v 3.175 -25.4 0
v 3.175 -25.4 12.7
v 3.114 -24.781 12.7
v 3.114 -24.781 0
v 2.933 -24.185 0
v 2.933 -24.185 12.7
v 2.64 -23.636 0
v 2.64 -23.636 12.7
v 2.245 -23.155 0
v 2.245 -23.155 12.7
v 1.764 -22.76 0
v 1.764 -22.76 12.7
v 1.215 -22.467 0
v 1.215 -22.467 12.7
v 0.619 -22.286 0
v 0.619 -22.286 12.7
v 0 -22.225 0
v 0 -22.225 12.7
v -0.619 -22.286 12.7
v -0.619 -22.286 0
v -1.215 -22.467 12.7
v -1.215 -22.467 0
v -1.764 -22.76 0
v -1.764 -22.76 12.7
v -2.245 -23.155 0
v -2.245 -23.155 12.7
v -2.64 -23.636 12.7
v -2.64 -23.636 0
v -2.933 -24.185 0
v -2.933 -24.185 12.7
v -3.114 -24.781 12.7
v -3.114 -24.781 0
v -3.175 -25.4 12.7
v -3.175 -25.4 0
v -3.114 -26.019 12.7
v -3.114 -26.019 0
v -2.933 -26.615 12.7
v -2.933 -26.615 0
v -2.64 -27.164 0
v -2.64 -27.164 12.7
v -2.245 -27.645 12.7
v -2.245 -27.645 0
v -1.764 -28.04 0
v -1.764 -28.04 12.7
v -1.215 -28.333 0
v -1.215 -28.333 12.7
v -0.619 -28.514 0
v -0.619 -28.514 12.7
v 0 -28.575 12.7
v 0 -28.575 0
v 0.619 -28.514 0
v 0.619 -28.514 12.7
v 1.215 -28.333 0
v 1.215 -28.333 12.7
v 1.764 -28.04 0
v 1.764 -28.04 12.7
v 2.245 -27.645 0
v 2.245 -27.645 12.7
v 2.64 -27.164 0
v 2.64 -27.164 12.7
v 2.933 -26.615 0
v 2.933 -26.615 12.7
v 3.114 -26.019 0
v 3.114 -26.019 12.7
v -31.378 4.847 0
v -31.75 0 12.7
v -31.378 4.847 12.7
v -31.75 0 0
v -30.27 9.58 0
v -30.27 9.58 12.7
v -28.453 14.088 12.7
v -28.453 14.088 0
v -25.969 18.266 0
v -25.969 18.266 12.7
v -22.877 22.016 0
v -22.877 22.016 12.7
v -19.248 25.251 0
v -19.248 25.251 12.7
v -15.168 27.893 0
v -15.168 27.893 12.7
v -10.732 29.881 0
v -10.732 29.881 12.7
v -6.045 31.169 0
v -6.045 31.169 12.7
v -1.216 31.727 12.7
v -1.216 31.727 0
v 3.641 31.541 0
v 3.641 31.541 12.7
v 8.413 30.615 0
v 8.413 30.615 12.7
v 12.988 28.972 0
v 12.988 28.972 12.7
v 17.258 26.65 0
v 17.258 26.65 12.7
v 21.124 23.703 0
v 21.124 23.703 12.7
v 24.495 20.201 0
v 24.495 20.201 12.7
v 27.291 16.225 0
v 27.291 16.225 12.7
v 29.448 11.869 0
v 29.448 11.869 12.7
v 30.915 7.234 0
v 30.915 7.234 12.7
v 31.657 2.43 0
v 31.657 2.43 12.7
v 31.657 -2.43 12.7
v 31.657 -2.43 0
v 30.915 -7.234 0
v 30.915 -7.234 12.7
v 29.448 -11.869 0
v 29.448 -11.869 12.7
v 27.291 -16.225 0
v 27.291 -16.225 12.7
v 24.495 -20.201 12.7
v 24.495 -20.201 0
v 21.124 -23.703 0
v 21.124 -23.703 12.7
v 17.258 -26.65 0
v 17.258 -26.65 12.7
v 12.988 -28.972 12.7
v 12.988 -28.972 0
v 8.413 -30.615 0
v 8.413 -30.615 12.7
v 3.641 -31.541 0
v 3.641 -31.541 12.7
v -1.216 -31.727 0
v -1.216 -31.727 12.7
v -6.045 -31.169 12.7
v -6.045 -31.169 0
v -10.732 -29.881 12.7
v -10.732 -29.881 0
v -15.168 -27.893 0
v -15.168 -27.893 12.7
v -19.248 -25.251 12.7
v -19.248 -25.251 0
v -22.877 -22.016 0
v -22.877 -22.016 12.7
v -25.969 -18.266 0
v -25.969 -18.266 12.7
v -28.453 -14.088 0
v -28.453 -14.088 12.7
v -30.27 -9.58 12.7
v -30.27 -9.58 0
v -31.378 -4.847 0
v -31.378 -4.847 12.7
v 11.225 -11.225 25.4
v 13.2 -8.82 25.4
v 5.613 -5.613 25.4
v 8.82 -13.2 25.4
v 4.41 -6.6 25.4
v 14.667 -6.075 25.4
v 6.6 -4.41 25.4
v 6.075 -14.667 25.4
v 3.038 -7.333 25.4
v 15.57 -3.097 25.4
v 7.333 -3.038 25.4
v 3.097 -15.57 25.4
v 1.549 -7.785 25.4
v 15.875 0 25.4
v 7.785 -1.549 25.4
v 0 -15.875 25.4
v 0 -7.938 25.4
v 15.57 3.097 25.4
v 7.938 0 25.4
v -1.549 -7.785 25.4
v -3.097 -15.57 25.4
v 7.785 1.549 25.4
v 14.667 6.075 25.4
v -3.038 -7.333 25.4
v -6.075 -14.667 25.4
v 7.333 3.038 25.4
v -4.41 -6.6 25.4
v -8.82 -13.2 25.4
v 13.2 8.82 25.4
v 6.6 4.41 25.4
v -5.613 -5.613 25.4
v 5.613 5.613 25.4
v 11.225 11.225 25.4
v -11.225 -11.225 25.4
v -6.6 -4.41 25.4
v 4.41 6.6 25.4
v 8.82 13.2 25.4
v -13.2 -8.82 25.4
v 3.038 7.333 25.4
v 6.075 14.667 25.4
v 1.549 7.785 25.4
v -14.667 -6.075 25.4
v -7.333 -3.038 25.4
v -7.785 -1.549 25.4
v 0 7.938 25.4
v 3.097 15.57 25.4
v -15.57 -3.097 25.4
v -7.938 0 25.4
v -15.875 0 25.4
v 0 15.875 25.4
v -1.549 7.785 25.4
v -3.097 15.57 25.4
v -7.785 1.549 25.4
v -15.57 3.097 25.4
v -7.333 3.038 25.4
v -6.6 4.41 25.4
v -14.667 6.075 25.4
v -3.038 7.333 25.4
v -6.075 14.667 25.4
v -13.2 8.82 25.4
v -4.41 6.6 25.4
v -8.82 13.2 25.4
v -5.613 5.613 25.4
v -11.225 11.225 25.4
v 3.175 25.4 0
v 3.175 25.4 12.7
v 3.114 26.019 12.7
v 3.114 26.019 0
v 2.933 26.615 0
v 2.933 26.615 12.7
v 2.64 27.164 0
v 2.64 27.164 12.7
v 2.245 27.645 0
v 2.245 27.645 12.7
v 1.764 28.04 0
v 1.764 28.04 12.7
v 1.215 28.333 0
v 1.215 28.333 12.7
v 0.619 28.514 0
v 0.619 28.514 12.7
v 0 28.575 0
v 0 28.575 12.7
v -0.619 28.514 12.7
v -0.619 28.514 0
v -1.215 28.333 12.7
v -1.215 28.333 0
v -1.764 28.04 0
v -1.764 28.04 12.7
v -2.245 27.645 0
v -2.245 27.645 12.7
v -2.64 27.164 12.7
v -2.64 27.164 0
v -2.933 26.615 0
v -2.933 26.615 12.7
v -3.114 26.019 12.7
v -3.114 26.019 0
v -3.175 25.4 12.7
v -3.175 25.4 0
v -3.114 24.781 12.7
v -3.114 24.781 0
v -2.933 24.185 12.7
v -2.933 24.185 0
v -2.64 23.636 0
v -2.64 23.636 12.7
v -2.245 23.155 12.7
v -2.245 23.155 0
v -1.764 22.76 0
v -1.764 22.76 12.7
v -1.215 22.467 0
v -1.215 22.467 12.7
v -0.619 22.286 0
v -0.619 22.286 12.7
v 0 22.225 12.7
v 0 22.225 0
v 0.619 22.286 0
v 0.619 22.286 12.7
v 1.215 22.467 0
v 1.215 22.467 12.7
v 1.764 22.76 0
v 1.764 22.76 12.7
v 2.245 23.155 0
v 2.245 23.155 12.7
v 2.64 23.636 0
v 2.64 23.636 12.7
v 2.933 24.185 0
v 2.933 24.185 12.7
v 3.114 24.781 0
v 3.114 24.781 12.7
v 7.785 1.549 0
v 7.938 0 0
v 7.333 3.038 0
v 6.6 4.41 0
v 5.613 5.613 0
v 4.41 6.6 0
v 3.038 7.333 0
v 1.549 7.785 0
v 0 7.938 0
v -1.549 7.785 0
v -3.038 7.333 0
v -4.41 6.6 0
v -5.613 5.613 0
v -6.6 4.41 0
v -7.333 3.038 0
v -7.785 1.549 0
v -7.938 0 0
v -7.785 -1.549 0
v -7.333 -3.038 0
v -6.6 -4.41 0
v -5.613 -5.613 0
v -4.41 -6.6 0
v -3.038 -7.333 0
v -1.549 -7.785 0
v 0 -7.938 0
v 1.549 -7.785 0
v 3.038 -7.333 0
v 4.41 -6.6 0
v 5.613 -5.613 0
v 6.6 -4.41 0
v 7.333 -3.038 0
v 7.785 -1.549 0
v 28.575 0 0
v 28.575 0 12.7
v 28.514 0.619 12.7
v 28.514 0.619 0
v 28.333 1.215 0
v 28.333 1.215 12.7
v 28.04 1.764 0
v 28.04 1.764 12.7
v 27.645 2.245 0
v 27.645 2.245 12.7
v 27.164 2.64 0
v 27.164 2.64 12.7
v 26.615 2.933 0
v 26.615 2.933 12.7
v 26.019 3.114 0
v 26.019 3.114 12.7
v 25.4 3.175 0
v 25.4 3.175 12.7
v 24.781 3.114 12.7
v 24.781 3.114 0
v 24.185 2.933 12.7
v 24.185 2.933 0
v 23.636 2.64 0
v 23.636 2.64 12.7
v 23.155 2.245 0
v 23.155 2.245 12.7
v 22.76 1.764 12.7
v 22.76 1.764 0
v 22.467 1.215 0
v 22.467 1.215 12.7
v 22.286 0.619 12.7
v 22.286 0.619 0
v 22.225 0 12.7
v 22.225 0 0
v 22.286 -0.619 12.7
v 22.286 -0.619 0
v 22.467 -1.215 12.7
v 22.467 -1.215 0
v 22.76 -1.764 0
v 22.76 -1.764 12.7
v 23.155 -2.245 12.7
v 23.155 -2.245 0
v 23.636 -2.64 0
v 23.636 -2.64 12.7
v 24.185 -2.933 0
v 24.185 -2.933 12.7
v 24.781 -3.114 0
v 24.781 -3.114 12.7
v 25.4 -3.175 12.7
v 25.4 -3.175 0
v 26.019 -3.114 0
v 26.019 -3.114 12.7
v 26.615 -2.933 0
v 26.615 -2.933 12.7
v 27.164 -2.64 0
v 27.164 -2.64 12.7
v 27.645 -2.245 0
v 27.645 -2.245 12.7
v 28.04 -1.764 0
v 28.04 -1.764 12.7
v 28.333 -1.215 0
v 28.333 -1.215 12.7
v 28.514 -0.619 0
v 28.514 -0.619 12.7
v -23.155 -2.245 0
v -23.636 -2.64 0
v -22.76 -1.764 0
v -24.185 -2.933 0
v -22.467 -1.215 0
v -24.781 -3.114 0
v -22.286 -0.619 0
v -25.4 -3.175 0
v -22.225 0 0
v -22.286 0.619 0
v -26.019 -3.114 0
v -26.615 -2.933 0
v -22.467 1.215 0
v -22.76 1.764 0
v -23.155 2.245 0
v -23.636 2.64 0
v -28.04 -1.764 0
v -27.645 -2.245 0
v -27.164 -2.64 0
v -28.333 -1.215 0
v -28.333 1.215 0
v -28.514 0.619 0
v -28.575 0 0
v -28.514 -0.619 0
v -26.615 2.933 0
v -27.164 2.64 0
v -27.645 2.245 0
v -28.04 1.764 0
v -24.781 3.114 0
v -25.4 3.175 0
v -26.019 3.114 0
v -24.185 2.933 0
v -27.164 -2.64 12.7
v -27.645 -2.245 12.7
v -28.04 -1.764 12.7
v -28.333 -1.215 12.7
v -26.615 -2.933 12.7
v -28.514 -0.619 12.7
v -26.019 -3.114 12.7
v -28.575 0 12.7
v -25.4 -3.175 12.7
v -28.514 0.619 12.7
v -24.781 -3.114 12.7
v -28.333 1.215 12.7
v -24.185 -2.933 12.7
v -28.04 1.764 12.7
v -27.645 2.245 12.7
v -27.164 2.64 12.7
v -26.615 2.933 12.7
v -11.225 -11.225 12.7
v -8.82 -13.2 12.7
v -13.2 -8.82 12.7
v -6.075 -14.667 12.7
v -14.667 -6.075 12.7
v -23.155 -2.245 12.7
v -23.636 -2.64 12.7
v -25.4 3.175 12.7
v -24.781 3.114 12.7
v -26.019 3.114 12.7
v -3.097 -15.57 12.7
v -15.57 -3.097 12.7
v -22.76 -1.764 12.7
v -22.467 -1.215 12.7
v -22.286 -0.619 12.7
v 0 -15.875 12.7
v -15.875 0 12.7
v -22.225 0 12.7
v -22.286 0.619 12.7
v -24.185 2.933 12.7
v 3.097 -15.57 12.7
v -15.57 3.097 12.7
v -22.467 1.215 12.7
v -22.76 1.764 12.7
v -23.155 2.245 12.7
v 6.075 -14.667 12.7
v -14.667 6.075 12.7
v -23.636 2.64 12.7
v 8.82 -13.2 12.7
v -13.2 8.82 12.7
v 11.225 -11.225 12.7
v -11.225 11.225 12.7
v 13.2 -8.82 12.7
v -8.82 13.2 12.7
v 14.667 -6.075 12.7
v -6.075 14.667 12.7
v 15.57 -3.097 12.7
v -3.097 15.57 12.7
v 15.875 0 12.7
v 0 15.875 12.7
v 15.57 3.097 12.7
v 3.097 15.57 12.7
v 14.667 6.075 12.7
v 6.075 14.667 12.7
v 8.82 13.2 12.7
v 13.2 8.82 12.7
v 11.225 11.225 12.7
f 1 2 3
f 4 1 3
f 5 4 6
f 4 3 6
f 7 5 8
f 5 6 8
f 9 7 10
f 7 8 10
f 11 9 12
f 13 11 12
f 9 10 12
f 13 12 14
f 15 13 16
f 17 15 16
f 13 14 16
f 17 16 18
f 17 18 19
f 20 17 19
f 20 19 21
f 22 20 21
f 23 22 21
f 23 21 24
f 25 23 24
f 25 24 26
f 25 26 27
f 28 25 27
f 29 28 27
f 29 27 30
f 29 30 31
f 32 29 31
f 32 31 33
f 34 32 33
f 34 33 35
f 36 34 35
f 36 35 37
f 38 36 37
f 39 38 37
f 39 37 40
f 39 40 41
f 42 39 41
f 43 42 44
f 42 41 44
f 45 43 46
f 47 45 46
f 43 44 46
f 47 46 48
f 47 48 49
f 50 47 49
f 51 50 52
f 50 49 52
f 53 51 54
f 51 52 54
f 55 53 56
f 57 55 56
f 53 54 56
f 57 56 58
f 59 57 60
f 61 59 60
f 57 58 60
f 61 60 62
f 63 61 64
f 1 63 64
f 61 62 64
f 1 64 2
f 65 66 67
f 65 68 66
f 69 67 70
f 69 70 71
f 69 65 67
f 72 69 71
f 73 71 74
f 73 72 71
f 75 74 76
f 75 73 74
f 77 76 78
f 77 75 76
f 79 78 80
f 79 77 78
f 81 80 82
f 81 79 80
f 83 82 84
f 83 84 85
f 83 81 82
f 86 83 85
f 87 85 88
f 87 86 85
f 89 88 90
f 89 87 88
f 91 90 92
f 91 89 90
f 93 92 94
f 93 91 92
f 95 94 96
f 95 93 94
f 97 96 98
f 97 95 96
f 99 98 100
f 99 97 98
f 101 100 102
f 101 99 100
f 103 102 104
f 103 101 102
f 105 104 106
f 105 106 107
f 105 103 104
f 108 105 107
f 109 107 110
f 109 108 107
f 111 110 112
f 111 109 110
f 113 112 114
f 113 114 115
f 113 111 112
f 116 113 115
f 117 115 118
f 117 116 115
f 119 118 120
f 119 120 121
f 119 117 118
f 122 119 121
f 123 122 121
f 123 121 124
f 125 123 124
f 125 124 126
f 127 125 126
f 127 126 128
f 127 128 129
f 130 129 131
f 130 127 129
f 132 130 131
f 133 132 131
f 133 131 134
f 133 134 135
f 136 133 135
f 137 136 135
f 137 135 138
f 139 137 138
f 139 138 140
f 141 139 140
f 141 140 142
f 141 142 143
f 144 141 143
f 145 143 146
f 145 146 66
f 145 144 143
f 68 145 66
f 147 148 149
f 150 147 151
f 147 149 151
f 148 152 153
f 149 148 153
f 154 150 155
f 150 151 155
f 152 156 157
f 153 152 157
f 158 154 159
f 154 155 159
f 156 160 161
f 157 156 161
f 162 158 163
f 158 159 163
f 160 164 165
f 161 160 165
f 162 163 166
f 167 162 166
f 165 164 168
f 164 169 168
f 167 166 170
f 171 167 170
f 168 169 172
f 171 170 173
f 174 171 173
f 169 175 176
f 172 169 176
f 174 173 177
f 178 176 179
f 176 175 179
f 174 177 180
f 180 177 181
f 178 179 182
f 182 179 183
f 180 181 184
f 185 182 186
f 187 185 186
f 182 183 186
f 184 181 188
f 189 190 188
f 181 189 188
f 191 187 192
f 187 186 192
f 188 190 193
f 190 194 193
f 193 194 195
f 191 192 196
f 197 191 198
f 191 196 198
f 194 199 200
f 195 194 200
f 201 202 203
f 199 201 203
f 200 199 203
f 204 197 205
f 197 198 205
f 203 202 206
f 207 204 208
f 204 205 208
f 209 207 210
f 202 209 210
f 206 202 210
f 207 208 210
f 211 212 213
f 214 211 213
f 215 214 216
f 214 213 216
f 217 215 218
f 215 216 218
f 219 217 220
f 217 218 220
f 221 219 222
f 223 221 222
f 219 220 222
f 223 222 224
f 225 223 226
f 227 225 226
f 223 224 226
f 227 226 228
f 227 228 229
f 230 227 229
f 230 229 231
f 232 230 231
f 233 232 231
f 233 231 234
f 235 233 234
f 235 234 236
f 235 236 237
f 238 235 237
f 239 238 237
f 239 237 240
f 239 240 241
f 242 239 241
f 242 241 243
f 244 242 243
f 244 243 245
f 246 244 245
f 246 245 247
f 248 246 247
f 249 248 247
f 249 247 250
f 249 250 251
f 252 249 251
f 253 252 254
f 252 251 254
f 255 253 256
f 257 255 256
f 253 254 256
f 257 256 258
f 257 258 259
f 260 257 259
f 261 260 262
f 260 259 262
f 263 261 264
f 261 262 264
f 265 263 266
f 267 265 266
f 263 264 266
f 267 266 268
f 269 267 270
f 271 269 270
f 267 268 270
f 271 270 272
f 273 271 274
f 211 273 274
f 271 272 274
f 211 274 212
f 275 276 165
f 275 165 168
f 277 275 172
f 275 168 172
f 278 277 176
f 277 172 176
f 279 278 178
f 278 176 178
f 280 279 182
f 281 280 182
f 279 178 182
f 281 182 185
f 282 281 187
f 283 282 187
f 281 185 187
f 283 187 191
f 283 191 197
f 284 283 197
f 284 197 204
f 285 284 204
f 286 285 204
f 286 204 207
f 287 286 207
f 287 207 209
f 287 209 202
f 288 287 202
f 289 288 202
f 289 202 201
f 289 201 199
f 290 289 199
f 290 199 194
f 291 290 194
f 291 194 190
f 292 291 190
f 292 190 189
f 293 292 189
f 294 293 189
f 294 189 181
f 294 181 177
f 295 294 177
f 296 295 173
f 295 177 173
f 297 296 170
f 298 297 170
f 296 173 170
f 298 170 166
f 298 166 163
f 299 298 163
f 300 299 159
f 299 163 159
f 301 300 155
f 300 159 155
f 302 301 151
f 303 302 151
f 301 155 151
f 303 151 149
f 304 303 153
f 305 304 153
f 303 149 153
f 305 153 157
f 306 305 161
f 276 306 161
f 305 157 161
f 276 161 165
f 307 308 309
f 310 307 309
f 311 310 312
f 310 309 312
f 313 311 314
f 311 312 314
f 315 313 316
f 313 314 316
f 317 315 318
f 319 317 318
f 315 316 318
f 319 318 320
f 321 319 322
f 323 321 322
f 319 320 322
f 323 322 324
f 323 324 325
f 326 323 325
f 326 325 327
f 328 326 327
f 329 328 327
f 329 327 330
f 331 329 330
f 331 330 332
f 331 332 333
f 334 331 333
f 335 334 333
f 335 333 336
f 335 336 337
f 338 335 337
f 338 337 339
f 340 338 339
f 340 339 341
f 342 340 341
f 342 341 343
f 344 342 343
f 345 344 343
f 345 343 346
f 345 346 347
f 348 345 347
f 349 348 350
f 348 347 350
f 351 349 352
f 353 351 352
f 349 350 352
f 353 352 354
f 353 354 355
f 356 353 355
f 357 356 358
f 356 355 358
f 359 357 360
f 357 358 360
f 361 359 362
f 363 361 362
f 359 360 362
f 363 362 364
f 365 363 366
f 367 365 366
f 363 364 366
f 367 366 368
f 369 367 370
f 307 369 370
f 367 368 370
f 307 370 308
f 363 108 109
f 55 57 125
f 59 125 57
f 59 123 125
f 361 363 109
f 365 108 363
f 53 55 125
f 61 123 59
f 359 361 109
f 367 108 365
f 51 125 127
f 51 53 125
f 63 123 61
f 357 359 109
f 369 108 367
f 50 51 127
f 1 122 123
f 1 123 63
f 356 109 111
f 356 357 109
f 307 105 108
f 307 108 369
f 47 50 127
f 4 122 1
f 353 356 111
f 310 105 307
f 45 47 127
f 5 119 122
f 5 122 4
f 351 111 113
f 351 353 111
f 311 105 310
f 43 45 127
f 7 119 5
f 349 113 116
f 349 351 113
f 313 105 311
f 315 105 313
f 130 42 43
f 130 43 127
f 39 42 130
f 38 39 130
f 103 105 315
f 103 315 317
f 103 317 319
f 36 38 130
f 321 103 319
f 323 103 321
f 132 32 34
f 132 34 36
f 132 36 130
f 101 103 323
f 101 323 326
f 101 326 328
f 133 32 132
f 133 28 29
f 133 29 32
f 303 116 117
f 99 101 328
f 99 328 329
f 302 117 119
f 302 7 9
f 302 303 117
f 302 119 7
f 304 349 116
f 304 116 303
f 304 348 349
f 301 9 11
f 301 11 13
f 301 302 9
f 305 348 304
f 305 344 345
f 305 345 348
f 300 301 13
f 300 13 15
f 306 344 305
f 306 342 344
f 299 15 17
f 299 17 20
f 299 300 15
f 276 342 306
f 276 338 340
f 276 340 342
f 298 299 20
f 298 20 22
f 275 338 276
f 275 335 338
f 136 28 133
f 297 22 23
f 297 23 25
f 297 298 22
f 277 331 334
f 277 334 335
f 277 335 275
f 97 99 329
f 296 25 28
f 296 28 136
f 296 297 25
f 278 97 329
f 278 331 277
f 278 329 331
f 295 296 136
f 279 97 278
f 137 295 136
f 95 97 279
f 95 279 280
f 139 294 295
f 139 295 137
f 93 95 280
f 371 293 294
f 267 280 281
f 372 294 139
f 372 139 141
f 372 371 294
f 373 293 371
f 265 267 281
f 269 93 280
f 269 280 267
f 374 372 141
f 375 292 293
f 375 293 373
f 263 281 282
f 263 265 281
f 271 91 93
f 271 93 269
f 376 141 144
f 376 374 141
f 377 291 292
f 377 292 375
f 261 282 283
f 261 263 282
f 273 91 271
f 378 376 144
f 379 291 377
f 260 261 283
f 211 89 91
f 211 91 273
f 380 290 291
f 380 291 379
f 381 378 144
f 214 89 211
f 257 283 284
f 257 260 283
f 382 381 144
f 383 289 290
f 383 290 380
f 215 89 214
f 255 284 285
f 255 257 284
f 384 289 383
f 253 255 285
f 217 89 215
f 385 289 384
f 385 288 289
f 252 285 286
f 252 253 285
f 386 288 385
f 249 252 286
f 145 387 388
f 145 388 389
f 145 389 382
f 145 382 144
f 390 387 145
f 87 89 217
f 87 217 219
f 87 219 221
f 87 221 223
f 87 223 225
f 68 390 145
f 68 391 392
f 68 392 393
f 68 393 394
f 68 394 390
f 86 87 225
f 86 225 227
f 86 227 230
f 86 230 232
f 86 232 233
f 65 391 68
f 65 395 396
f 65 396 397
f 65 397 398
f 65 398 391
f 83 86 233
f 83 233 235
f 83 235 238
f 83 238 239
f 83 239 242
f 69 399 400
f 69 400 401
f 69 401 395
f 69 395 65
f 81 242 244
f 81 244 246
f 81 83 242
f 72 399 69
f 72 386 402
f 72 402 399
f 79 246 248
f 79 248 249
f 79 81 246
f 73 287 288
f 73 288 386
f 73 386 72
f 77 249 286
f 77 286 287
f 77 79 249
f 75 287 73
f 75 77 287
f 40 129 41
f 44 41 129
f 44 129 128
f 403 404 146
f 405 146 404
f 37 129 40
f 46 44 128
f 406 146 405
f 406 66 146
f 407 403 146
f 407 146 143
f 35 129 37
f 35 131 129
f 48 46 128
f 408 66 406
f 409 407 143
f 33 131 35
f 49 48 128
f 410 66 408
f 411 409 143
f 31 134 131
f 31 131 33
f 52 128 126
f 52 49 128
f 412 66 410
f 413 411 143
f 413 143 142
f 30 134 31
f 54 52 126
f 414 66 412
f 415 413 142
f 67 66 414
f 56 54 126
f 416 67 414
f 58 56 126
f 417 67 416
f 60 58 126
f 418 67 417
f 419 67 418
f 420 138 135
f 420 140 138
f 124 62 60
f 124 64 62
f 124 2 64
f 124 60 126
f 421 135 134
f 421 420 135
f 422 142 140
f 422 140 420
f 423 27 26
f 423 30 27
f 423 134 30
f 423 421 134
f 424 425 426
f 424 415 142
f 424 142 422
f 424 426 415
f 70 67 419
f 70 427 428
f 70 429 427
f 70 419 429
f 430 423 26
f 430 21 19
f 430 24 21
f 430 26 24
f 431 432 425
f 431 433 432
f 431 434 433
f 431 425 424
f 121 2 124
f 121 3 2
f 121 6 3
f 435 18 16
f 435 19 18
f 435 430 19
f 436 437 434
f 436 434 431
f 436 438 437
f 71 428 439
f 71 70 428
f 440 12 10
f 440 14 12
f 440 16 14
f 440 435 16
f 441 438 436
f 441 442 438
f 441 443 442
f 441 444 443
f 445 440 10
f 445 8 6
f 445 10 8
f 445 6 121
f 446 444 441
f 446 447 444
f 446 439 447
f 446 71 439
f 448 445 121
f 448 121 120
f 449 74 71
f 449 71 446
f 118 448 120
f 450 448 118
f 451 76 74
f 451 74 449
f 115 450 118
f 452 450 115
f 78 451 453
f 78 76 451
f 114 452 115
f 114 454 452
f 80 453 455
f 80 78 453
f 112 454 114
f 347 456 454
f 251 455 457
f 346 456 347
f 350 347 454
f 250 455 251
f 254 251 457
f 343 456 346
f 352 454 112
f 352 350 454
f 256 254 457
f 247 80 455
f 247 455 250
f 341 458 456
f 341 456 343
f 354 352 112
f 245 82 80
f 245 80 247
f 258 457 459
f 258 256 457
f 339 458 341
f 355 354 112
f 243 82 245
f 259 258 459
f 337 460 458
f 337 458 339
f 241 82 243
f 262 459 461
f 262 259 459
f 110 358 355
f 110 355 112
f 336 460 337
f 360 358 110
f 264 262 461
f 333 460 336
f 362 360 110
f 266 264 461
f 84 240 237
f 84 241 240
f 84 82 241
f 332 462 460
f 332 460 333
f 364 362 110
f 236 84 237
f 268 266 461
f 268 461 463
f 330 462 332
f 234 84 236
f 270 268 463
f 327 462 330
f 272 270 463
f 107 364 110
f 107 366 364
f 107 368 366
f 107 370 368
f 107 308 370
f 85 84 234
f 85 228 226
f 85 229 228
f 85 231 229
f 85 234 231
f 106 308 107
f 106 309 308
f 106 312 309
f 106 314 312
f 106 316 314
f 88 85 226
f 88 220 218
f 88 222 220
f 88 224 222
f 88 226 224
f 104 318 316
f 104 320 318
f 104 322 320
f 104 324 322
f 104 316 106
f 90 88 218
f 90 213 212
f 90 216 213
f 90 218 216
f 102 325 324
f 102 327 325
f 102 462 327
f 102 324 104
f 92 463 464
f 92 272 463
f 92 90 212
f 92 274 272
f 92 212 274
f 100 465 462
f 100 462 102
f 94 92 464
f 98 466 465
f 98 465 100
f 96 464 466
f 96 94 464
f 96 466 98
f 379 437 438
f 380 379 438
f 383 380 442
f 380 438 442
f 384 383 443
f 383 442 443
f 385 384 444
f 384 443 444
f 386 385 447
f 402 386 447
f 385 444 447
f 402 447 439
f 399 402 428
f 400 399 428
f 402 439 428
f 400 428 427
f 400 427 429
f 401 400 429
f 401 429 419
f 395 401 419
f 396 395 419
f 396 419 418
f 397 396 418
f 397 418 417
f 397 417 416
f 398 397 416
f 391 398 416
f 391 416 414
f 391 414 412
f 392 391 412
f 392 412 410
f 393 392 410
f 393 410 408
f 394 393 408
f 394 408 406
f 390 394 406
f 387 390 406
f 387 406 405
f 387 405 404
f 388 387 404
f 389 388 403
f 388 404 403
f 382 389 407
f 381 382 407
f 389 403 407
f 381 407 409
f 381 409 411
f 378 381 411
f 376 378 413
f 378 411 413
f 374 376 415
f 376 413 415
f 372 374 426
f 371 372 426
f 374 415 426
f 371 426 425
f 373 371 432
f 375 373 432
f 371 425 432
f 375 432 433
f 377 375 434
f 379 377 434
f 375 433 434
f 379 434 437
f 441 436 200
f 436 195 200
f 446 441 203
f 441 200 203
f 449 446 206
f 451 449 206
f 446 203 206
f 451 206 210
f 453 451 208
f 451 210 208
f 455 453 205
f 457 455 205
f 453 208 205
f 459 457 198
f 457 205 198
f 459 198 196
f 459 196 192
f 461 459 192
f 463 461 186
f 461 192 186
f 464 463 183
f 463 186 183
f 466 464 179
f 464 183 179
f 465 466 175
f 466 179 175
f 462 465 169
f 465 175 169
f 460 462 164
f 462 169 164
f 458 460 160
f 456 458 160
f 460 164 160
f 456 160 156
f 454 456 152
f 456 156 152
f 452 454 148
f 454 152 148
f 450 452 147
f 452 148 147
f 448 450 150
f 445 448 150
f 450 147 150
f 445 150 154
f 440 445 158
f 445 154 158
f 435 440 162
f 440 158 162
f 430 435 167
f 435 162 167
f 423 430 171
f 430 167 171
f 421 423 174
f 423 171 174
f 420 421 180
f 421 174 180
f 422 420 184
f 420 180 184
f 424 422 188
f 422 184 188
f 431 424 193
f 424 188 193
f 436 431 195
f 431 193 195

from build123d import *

# Parameters (mm, degrees)
F0_W     = 15.875
F0_H     = 12.7
F2_R     = 7.9375
F3_DEPTH = 25.401
F4_R     = 3.175
F5_DEPTH = 12.701


with BuildPart() as f1:
    # F0 (on Front) → F1 (revolve)
    with BuildSketch(Plane.XZ):
        Polygon((-31.75, 0), (0, 0), (0, 12.7), (-15.875, 12.7), (-31.75, 12.7), align=None)
        with Locations((-7.9375, 19.05)):
            Rectangle(F0_W, F0_H)
    revolve(axis=Axis((0, 0, 2.126115), (0, 0, -1)))

    # F2 (on face) → F3 (cut, through all)
    with BuildSketch(Plane.XY.offset(25.4)):
        Circle(F2_R)
    extrude(amount=-F3_DEPTH, mode=Mode.SUBTRACT)

    # F4 (on face) → F5 (cut, through all)
    with BuildSketch(Plane.XY.offset(12.7)):
        with Locations((0, 25.4)):
            Circle(F4_R)
        with Locations((25.4, 0)):
            Circle(F4_R)
        with Locations((0, -25.4)):
            Circle(F4_R)
        with Locations((-25.4, 0)):
            Circle(F4_R)
    extrude(amount=-F5_DEPTH, mode=Mode.SUBTRACT)


solid = f1.part
